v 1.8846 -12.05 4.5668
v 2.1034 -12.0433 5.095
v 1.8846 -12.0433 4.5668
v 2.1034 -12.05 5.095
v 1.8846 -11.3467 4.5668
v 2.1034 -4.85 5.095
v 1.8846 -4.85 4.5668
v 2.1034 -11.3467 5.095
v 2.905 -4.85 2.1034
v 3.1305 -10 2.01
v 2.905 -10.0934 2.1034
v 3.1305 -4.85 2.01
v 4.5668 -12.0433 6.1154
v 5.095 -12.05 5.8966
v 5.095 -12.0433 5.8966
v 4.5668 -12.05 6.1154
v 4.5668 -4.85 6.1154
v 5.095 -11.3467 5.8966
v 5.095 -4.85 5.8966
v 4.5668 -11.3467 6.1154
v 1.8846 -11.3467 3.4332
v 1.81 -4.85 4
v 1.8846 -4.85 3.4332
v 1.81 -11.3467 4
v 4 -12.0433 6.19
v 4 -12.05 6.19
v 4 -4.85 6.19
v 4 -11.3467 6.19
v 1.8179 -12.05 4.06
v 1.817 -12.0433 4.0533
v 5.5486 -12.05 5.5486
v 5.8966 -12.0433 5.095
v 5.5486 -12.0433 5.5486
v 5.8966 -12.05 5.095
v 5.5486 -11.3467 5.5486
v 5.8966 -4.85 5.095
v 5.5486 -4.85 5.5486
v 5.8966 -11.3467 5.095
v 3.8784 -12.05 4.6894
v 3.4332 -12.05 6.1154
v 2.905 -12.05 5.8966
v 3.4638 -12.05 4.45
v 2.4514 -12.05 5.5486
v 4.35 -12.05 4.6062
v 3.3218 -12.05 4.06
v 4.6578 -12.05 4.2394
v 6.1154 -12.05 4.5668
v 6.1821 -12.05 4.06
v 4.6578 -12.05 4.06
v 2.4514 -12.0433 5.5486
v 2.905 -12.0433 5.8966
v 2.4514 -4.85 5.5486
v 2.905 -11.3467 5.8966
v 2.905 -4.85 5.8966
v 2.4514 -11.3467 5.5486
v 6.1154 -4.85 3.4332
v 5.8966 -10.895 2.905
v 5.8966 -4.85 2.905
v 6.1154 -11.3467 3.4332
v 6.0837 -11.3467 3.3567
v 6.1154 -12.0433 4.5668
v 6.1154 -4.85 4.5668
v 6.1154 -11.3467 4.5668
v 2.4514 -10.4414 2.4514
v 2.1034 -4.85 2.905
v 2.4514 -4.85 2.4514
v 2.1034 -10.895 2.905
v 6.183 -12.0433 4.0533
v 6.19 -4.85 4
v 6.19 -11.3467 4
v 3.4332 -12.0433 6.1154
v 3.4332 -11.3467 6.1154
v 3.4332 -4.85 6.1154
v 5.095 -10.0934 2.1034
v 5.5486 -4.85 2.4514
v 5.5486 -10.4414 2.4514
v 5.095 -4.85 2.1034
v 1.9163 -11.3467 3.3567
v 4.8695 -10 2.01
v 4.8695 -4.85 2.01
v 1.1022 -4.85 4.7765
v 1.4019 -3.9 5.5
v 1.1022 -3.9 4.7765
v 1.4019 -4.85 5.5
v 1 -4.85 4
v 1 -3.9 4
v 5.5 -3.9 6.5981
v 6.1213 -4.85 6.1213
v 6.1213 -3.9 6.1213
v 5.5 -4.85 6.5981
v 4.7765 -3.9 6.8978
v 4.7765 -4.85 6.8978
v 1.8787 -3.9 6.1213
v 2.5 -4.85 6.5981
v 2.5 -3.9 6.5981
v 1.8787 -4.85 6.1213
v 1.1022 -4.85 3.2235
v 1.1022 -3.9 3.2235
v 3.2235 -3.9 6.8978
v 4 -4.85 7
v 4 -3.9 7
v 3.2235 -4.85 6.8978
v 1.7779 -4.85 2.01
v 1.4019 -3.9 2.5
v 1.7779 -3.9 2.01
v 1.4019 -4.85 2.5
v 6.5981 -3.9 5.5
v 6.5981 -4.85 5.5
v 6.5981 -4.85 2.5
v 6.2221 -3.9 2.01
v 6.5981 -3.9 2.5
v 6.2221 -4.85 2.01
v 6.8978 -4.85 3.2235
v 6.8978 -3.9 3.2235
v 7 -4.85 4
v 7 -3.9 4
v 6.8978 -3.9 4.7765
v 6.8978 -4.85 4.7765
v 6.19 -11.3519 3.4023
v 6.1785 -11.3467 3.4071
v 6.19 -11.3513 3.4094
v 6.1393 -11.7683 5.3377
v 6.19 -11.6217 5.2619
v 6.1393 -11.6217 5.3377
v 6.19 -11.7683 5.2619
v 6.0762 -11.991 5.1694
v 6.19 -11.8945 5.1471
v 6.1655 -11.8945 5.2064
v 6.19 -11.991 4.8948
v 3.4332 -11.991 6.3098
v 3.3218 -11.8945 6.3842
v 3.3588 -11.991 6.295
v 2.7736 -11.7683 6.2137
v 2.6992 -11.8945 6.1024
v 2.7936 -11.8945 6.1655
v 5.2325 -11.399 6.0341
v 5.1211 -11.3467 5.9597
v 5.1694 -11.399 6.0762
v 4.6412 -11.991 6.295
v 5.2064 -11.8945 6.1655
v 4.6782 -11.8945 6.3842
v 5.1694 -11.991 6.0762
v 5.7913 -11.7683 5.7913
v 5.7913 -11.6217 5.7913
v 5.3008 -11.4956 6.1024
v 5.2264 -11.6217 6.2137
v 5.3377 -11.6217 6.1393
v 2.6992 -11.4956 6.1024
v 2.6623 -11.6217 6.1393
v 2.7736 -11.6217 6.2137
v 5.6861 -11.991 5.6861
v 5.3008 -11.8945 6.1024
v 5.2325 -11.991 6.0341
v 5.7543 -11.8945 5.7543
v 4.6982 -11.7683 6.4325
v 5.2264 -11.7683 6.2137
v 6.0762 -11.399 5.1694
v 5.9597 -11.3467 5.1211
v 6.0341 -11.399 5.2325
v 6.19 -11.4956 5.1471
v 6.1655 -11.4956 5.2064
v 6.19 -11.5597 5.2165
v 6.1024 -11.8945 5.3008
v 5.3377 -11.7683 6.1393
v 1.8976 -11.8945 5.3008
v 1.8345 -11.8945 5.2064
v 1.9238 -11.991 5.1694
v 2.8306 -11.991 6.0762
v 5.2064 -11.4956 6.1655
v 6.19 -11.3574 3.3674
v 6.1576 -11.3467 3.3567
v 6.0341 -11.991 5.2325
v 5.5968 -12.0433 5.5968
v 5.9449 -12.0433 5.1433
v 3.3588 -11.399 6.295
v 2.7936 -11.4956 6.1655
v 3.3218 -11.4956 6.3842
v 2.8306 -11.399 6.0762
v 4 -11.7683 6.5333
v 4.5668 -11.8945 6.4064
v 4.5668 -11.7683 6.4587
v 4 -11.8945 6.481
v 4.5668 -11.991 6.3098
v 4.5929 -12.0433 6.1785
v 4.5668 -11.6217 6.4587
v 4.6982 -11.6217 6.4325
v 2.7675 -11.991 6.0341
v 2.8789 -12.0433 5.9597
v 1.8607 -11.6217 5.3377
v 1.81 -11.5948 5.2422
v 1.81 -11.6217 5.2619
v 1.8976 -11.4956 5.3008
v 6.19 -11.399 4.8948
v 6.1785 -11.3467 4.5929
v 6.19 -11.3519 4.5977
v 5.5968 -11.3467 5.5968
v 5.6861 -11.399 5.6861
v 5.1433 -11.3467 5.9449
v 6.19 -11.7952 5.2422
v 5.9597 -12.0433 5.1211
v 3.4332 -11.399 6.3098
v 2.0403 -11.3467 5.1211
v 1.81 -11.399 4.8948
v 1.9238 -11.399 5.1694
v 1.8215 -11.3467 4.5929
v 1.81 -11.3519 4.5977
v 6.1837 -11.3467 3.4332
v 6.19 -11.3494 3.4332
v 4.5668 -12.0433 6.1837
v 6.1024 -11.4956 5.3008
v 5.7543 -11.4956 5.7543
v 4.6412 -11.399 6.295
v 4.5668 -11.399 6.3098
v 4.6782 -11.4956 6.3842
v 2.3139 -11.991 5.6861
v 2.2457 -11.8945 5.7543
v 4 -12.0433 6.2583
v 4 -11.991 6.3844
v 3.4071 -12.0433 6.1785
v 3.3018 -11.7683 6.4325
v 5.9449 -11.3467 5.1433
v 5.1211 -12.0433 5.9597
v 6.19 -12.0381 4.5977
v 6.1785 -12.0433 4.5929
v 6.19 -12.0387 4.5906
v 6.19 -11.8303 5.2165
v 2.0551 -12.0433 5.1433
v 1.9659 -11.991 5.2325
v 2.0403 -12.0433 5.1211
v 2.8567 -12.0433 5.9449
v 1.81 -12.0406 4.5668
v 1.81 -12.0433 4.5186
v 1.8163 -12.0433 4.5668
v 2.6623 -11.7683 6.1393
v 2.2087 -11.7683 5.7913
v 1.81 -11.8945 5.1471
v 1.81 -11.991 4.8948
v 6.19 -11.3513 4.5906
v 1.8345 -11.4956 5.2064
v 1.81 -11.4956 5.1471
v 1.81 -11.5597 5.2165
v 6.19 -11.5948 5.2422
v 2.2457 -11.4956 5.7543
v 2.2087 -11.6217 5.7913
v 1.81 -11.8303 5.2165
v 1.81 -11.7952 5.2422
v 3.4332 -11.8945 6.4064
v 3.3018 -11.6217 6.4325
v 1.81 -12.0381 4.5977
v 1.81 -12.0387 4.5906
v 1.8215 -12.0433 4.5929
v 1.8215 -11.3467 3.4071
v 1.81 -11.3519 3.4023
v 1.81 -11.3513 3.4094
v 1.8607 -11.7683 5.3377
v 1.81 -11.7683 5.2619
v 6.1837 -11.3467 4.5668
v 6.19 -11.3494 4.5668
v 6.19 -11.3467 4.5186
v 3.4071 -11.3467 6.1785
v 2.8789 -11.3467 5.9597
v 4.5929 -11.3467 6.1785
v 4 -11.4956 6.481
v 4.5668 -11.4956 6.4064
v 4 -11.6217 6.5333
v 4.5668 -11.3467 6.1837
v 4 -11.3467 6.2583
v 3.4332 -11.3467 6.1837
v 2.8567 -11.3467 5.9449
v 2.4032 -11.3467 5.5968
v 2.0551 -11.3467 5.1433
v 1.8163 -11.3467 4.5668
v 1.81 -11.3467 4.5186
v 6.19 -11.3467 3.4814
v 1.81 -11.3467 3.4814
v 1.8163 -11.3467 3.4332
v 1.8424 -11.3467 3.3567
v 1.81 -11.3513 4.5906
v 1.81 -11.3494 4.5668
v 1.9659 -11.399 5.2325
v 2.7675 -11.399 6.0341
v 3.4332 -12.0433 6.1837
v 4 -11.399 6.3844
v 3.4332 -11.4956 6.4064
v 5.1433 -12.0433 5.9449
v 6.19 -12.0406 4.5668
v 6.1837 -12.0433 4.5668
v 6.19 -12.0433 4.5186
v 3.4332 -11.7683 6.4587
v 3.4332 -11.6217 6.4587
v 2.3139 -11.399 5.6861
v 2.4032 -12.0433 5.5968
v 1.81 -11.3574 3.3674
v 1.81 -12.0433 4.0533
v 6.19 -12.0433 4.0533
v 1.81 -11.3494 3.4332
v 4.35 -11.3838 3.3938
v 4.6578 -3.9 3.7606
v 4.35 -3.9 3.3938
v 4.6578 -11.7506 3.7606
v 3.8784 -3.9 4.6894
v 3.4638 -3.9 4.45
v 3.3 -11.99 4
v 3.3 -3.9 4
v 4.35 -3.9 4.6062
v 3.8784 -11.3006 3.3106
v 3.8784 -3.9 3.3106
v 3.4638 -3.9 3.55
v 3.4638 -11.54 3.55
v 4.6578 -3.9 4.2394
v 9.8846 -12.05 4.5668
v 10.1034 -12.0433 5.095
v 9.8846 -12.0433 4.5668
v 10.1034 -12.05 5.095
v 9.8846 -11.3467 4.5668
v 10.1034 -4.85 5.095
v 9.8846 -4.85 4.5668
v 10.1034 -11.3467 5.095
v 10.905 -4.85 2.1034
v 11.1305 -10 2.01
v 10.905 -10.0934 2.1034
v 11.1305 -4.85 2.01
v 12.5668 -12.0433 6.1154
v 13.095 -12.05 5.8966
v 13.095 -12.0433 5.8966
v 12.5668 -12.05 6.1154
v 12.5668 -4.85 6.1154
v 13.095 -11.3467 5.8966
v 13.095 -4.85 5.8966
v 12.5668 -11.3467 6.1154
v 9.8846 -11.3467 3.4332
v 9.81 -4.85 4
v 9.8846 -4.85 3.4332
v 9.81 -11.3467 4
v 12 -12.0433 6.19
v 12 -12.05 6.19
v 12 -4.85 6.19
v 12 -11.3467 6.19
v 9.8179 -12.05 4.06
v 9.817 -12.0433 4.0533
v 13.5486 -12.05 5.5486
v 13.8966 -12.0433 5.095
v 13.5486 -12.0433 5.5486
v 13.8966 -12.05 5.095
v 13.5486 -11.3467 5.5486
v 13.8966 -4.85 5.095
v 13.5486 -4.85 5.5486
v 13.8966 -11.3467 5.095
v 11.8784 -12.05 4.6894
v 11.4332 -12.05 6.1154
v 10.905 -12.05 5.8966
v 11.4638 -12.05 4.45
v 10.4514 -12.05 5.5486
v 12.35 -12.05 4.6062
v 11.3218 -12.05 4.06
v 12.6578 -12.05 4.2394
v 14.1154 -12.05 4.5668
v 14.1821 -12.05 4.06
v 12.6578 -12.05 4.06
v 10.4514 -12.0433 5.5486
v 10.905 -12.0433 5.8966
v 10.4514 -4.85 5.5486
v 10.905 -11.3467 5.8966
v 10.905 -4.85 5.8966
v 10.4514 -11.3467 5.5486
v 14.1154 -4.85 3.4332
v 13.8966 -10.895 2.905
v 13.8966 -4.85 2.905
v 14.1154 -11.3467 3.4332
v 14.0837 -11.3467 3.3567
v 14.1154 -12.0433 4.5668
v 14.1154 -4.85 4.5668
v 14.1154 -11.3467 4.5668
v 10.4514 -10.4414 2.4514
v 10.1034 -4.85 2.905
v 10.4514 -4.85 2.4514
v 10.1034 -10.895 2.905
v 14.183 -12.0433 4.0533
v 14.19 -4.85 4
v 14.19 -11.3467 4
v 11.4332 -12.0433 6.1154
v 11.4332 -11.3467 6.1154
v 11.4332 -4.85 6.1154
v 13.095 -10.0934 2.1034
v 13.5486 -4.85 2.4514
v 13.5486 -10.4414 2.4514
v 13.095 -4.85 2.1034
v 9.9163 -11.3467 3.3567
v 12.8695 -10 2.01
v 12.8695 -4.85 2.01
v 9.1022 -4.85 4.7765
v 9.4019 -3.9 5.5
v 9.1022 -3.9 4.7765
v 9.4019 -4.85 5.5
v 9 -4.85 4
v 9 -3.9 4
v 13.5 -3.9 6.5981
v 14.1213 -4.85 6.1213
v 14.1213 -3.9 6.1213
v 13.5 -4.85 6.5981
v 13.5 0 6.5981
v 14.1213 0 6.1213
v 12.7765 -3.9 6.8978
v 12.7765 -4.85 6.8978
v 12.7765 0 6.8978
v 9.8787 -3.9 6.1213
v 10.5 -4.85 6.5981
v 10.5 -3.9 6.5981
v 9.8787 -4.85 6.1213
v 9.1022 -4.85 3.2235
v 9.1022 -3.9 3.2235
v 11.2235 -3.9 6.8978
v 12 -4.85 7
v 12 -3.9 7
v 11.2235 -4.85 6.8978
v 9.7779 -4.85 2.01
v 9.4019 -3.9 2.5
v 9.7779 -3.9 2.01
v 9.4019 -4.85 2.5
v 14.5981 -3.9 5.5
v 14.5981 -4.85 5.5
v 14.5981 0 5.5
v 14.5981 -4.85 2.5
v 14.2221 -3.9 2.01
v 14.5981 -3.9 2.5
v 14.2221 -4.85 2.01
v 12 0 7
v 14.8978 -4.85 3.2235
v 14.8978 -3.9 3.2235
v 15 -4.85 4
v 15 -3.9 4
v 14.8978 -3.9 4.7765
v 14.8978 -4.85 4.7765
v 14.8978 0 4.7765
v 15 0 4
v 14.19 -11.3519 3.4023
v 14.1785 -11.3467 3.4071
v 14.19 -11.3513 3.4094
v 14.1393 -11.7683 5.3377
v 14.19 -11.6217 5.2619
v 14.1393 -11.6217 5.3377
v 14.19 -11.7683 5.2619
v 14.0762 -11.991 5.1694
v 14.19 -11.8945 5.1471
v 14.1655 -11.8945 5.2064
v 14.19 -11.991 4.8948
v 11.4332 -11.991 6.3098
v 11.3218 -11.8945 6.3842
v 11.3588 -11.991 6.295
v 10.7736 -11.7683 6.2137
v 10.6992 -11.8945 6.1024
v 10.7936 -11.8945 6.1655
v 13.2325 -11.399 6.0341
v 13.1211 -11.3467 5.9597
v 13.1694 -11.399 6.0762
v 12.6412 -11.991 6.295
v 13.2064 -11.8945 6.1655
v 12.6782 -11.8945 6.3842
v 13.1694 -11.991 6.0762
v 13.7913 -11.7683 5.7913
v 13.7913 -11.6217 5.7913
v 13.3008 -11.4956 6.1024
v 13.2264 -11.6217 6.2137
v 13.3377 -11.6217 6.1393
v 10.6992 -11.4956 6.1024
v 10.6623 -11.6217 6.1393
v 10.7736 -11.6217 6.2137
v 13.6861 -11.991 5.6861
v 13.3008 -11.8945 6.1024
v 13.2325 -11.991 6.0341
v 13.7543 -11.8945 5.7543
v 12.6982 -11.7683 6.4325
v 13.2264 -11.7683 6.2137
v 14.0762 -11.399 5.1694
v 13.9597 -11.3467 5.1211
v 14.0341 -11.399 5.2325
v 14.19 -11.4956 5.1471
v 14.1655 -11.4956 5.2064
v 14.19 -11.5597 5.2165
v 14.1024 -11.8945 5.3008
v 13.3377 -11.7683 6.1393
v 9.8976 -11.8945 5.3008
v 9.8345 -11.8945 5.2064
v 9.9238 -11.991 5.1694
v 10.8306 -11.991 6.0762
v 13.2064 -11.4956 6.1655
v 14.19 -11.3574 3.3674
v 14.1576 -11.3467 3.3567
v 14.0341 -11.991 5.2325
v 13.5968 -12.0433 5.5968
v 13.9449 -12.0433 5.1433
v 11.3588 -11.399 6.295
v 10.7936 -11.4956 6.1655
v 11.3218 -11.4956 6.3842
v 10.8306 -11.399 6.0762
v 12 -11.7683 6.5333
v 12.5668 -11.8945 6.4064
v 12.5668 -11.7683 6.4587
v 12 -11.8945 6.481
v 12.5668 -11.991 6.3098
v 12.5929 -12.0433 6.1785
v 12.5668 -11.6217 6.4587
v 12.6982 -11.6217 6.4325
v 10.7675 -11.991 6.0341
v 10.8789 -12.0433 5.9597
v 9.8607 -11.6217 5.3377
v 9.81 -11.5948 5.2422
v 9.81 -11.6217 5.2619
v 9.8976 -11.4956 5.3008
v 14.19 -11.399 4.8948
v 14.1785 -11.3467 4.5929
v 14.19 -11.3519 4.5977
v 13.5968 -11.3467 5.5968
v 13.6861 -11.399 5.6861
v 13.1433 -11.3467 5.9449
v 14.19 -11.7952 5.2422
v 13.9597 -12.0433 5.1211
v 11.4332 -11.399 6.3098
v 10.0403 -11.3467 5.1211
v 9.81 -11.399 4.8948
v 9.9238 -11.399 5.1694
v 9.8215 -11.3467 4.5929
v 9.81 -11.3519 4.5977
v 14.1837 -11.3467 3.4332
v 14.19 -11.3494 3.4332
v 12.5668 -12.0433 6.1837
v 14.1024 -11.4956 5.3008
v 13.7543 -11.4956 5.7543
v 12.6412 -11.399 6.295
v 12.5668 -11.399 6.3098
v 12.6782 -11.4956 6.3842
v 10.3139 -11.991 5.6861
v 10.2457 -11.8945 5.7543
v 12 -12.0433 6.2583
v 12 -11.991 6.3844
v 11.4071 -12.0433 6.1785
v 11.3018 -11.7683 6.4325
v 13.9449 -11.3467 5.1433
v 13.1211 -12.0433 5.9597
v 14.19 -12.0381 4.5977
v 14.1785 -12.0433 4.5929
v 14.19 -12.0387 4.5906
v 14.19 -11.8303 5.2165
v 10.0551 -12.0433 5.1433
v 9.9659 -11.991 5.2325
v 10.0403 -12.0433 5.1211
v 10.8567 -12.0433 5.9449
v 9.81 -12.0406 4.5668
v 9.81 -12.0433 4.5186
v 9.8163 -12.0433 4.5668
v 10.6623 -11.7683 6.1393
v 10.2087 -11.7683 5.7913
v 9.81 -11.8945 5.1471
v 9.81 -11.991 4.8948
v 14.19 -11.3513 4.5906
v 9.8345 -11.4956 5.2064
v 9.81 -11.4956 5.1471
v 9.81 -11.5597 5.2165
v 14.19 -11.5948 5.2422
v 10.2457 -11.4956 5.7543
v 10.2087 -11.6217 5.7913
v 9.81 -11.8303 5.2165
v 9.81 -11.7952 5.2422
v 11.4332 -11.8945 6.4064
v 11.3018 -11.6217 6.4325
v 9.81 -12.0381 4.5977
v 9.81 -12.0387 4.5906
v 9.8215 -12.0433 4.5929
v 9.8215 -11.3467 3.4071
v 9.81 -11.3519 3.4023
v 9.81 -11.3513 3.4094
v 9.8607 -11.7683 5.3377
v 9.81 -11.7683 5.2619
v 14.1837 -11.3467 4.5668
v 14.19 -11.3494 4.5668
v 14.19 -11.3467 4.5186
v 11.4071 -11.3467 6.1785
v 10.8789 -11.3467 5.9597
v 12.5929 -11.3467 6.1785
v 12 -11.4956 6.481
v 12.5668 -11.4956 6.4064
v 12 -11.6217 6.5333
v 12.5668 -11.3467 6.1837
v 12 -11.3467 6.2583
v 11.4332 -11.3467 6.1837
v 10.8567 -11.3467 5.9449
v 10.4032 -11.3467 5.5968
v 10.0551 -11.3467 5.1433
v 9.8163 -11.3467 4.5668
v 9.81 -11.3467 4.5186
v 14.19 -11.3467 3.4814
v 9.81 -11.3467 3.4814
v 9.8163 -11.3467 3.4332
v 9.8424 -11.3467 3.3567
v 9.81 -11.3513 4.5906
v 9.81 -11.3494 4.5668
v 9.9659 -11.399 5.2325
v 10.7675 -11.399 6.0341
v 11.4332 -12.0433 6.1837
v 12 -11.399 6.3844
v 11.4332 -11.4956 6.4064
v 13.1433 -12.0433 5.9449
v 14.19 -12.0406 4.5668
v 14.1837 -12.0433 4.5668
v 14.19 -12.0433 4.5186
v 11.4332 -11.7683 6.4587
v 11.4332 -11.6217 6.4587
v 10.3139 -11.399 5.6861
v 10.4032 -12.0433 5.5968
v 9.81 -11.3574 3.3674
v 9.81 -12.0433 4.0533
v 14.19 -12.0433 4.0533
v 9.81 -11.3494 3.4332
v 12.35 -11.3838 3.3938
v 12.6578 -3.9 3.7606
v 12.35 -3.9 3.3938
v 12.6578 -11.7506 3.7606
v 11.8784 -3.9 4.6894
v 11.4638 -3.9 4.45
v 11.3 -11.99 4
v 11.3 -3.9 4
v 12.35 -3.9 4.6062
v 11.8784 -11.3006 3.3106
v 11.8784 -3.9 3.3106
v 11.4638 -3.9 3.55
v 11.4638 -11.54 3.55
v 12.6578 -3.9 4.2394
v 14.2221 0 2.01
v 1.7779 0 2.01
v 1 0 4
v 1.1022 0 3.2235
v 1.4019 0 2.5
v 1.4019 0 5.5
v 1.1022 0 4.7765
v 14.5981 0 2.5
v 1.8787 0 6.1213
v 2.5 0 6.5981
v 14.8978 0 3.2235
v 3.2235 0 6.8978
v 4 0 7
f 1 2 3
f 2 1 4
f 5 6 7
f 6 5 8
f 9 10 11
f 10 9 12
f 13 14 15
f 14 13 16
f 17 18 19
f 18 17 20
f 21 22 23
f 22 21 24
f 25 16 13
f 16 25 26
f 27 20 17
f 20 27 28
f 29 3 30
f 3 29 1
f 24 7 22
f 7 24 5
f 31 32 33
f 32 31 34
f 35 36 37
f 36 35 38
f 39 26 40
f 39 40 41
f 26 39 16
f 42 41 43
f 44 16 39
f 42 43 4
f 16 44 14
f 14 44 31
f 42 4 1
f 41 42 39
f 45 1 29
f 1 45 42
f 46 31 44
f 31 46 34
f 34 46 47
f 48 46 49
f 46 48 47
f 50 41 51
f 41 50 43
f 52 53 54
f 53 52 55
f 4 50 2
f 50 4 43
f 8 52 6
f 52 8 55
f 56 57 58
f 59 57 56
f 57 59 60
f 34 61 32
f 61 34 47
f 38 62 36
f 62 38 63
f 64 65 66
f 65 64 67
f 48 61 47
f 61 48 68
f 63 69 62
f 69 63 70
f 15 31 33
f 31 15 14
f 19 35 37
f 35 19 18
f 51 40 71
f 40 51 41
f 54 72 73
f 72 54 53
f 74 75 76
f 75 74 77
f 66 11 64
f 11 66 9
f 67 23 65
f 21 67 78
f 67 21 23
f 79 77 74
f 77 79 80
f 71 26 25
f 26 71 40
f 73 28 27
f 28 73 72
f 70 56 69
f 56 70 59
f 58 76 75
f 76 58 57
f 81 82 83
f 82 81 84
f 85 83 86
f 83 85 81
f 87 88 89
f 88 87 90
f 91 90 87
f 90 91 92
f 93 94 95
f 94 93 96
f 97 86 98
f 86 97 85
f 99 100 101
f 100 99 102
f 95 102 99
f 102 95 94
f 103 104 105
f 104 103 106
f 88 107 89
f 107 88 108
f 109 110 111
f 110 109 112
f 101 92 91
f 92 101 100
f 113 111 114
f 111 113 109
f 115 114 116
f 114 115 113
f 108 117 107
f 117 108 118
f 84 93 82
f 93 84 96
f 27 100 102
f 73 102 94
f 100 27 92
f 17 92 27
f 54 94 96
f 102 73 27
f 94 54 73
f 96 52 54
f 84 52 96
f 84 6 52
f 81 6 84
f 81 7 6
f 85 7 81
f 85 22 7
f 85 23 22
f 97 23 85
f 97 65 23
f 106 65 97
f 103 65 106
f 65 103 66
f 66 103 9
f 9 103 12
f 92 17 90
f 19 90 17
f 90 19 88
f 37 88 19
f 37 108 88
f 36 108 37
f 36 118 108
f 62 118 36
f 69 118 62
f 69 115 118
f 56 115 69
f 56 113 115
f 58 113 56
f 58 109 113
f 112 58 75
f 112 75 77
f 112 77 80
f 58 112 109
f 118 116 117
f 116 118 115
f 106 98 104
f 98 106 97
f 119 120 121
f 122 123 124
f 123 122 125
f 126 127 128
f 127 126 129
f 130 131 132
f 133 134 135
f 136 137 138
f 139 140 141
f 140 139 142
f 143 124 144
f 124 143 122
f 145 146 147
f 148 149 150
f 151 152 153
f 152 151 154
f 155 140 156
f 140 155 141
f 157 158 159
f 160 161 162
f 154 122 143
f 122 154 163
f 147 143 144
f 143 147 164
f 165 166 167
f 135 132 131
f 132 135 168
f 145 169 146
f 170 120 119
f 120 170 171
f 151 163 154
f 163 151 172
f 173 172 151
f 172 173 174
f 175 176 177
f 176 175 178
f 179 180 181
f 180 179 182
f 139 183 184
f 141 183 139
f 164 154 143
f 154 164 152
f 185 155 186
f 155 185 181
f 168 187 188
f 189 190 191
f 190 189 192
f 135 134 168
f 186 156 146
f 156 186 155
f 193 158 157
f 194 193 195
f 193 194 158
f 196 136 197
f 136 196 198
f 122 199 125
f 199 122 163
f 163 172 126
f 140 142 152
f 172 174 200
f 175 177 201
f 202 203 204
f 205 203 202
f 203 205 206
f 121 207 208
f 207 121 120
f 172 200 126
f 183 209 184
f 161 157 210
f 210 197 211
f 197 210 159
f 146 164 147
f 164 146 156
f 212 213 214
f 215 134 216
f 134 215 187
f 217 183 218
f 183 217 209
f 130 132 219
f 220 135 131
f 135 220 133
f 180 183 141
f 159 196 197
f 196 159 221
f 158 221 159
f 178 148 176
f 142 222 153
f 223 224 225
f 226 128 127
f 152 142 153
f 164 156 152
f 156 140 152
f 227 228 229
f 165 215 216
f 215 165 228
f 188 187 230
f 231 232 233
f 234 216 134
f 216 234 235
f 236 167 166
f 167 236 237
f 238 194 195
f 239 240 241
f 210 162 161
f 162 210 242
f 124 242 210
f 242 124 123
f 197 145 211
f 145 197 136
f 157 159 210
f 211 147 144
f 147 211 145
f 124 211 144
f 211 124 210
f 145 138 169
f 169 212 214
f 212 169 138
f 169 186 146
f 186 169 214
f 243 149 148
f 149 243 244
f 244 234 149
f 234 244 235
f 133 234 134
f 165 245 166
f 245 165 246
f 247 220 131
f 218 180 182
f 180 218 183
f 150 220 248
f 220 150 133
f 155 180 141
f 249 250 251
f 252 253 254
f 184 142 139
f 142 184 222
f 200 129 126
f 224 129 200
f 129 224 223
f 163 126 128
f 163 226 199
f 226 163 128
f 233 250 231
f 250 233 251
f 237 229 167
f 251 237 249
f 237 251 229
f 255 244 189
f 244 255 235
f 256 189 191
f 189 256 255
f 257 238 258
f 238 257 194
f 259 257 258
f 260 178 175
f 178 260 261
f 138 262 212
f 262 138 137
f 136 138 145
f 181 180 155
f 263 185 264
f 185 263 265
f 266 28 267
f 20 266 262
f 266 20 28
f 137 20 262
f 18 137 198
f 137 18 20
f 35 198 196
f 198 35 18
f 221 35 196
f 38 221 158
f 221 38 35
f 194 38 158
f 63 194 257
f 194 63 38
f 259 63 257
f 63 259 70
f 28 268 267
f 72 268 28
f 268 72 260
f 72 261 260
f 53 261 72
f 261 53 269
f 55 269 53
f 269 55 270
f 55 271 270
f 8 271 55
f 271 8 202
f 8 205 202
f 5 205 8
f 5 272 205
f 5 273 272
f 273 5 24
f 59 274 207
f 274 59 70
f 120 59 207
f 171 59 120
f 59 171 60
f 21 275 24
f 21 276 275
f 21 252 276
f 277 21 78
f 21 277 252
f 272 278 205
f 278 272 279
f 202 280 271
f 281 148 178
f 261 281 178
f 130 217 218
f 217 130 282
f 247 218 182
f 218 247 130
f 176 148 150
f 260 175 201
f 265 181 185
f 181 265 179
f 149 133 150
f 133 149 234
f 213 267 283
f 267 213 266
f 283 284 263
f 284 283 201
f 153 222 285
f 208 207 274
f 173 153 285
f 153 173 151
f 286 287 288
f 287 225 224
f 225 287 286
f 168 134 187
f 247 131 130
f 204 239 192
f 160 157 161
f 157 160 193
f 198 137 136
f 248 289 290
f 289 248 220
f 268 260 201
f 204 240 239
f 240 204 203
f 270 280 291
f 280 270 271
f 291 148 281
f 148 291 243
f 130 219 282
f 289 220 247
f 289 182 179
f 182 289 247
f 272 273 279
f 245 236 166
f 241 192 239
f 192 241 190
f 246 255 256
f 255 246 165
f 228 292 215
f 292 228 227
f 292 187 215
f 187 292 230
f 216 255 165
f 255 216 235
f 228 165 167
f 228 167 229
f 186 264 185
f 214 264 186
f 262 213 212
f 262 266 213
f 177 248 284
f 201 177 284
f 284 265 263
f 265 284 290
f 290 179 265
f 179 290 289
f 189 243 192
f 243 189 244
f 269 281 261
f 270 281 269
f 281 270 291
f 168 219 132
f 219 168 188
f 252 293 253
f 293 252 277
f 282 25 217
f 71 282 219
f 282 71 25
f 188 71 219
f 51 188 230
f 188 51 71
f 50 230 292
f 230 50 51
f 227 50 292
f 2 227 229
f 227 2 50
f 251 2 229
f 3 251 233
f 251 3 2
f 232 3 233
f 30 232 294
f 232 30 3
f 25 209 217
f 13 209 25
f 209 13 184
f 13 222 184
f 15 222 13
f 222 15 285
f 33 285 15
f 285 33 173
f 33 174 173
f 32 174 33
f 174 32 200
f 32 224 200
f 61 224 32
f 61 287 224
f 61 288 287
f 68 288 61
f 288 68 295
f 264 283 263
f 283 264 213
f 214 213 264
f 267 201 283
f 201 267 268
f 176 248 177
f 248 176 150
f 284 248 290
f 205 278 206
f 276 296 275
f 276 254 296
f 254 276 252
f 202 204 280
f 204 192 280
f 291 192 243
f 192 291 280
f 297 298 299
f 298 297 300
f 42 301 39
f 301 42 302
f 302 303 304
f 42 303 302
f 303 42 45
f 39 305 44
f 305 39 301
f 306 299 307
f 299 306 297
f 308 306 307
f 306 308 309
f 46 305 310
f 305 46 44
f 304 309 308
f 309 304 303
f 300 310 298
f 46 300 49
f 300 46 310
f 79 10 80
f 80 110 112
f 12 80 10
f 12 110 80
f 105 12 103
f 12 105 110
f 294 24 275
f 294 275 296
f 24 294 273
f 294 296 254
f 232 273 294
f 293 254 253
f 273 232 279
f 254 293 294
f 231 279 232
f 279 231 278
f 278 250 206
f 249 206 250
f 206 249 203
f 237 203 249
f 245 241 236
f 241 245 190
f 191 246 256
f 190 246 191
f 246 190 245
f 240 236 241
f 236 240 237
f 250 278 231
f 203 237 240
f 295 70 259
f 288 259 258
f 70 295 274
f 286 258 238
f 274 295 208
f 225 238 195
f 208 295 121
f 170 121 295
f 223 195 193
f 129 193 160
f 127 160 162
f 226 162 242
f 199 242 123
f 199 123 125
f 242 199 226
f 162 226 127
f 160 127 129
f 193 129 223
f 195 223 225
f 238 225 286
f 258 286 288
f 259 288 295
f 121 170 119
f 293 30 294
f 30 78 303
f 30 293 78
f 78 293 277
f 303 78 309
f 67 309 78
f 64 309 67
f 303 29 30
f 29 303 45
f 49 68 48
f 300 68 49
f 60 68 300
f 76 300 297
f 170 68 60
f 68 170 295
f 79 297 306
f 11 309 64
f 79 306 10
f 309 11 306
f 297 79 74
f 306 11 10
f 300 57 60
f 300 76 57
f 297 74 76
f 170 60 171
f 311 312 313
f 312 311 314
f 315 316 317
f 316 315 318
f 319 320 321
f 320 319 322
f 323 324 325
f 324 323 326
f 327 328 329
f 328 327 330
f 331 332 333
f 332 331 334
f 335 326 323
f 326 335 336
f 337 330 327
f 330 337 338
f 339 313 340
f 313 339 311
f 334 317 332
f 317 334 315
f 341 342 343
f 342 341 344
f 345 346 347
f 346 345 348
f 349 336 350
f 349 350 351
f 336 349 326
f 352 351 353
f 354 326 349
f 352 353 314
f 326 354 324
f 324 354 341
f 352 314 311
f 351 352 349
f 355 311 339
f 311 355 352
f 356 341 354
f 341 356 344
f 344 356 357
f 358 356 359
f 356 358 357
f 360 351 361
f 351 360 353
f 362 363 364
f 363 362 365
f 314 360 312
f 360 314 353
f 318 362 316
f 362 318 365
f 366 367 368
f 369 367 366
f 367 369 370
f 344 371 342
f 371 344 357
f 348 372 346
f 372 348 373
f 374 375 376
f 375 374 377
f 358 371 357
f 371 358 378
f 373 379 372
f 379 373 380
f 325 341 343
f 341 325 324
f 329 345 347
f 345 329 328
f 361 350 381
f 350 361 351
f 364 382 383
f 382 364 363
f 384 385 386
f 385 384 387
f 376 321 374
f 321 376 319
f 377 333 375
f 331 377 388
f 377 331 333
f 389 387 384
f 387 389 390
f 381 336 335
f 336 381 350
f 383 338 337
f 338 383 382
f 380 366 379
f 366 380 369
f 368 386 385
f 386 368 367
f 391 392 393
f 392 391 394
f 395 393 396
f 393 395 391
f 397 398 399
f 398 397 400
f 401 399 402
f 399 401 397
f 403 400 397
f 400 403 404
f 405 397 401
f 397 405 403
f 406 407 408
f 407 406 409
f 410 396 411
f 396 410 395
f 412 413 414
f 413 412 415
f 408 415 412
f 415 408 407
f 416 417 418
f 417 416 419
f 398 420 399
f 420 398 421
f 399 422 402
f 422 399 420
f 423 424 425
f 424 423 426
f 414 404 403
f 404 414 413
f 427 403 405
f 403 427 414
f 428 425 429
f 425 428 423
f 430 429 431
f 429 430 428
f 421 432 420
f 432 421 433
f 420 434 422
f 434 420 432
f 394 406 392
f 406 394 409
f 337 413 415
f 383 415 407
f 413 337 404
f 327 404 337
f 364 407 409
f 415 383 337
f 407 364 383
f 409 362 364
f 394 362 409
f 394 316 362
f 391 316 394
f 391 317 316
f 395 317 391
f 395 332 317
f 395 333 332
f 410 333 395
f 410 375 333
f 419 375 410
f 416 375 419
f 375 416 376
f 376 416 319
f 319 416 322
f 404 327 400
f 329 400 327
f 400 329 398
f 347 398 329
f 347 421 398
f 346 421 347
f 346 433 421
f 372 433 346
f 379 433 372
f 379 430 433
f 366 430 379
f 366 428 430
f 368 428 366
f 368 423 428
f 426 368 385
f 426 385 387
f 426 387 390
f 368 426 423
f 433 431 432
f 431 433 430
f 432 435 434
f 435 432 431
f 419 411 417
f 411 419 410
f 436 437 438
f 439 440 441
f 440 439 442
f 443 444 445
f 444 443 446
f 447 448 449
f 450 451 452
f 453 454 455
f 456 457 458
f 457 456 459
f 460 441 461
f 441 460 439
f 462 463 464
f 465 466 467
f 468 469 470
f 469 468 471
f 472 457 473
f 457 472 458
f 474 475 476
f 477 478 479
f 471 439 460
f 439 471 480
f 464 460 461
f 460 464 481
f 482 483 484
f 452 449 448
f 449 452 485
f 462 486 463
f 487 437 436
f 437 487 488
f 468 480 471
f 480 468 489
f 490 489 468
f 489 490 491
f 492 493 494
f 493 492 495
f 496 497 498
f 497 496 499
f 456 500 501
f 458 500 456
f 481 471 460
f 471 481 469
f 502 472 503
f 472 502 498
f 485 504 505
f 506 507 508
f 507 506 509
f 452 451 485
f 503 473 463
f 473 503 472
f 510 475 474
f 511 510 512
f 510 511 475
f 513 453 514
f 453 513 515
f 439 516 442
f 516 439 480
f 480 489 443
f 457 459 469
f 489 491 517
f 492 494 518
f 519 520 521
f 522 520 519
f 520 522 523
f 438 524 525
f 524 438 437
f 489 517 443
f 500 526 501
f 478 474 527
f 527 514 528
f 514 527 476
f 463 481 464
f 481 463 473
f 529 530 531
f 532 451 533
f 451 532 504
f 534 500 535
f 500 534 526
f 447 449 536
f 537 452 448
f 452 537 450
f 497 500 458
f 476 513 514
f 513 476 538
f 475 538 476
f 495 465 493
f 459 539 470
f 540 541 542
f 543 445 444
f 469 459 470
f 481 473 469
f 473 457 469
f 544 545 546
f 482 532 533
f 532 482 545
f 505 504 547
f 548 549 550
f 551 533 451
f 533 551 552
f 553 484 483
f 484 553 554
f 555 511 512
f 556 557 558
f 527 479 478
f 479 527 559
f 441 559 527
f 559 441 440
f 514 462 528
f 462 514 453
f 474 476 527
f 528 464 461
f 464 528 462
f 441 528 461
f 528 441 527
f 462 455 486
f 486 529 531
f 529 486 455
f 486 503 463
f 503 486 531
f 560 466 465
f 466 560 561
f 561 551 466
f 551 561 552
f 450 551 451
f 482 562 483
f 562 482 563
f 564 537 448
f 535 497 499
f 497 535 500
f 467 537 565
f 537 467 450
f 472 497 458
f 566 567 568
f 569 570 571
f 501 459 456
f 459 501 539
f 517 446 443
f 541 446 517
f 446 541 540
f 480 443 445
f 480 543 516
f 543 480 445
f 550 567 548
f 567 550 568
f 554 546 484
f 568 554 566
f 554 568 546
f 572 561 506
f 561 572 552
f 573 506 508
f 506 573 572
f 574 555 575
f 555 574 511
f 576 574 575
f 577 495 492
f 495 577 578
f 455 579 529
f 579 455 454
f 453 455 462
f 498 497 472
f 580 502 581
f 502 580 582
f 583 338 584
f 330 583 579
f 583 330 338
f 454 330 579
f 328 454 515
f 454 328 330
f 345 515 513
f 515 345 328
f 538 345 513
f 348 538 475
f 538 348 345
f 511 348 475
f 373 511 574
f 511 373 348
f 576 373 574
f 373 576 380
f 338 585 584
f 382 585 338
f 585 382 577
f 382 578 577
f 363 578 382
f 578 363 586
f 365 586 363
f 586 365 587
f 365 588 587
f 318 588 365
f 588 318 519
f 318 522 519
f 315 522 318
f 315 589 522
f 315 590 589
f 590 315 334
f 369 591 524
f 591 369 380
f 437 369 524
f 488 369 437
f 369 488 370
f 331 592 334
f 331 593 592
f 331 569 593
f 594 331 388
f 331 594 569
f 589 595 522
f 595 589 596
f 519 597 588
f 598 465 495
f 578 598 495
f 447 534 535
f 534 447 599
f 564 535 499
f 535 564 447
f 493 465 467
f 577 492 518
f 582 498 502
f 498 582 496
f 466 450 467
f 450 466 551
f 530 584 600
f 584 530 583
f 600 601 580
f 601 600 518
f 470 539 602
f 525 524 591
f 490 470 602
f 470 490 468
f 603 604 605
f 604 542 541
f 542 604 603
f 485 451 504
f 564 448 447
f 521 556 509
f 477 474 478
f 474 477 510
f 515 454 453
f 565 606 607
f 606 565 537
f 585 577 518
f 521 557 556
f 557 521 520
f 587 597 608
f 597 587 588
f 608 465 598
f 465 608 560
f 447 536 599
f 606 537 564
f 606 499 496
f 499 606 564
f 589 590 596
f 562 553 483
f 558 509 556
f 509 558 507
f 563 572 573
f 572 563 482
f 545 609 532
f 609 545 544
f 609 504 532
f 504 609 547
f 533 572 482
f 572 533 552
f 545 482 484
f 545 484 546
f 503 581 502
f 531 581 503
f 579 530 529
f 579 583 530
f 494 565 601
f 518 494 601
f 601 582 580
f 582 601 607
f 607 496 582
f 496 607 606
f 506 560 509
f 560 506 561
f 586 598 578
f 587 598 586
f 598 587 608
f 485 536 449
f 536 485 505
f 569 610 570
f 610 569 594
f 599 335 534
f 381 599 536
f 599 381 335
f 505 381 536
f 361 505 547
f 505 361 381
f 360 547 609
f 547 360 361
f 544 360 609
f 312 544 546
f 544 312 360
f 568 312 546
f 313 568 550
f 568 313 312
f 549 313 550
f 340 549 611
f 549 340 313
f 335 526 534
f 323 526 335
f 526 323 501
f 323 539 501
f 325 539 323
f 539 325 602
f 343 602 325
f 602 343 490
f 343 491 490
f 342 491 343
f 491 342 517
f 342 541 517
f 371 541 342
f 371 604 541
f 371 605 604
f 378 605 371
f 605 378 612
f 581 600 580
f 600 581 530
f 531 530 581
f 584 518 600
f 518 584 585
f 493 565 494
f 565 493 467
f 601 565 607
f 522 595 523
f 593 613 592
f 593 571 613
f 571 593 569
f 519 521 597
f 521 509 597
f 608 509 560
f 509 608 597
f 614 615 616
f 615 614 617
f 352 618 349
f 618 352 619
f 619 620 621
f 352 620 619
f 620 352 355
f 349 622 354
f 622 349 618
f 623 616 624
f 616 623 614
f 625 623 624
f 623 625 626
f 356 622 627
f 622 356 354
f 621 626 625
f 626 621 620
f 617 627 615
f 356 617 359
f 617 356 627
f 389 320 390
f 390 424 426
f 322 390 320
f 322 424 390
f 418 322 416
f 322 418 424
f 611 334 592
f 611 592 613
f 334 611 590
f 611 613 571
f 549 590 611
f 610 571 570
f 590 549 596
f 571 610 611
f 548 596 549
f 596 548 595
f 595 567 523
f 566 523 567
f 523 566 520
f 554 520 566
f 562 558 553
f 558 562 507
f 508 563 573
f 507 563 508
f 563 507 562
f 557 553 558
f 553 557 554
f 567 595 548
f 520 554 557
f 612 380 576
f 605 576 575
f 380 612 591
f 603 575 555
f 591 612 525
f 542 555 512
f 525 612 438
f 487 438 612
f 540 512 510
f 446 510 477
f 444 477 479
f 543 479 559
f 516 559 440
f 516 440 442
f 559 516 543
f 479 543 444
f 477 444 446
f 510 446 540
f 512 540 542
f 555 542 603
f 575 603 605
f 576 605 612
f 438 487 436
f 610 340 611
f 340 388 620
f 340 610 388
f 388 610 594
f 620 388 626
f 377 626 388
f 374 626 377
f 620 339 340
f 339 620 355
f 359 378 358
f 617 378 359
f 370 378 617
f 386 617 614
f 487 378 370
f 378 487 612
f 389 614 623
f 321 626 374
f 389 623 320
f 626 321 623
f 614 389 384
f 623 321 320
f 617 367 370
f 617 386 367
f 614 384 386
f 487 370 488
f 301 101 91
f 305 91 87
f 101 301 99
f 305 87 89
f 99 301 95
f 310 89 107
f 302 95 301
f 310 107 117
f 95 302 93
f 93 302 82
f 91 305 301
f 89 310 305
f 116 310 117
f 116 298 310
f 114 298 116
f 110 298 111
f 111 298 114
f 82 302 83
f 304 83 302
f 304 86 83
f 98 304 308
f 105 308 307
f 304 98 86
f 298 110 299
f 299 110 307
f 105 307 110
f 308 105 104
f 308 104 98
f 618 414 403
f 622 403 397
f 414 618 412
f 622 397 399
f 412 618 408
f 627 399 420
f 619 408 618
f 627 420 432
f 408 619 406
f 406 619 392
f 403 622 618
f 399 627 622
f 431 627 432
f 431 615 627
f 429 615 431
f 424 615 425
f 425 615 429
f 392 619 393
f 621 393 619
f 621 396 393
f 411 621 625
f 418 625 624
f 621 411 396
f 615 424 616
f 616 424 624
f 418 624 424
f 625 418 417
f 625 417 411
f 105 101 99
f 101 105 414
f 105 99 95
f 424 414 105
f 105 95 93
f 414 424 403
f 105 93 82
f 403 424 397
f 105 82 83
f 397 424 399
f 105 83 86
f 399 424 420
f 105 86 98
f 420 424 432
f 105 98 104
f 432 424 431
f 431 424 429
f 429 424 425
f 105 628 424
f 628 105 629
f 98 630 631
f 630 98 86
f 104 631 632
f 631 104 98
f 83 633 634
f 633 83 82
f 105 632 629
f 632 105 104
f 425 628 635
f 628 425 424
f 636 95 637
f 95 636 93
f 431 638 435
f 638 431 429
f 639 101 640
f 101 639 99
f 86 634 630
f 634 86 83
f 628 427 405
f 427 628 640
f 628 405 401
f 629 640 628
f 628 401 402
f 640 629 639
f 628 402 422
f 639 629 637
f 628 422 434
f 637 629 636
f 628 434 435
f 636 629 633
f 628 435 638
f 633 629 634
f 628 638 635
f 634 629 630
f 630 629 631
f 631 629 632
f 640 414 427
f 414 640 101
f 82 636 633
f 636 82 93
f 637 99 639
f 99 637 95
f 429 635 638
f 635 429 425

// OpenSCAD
// file: PELA-simplified-technic-peg.scad
/*
PELA Parametric LEGO-compatible Technic Connector Peg

PELA Parametric Blocks - 3D Printed LEGO-compatible parametric blocks

Published at https://PELAblocks.org

By Paul Houghton
Twitter: @mobile_rat
Email: paulirotta@gmail.com
Blog: https://medium.com/@paulhoughton

Creative Commons Attribution-ShareAlike 4.0 International License
    https://creativecommons.org/licenses/by-sa/4.0/legalcode

Open source design, Powered By Futurice. Come work with the best.
    https://www.futurice.com/
*/

include <../style.scad>
include <../material.scad>
use <../PELA-block.scad>
use <PELA-technic-peg.scad>

/* [Technic Simplified Peg] */

// Show the inside structure [mm]
_cut_line = 0; // [0:1:100]

// Printing material (set to select calibrated knob, socket and axle hole fit)
_material = 0; // [0:PLA, 1:ABS, 2:PET, 3:Biofila Silk, 4:Pro1, 5:NGEN, 6:NGEN FLEX, 7:Bridge Nylon, 8:TPU95, 9:TPU85/NinjaFlex, 10:Polycarbonite]
// Is the printer nozzle >= 0.5mm? If so, some features are enlarged to make printing easier
_large_nozzle = true;

// An axle which fits loosely in a technic bearing hole
_axle_radius = 2.1; // [0.1:0.1:4]

// Size of the hollow inside a pin
_peg_center_radius=0.8; // [0.1:0.1:4]

// Size of the connector lock-in bump at the ends of a Pin
_peg_tip_length = 0.7; // [0.1:0.1:4]

// Width of the long vertical flexture slots in the side of a pin
_peg_slot_thickness = 0.0; // [0.1:0.1:4]


/* [Simplified Peg] */

// Size of the flat bottom cut to make the pin more easily printable
_bottom_flatness = 0.2; // [0.0:0.1:5]

// Size of the end angle cuts to ease tip flex
_end_cut_length = 6; // [0.0:0.1:10]





///////////////////////////////
// DISPLAY
///////////////////////////////

simplified_peg(material=_material, large_nozzle=_large_nozzle, cut_line=_cut_line, axle_radius=_axle_radius, peg_center_radius=_peg_center_radius, peg_length=_peg_length, peg_tip_length=_peg_tip_length, peg_slot_thickness=_peg_slot_thickness, bottom_flatness=_bottom_flatness, end_cut_length=_end_cut_length);



//////////////////
// Functions
//////////////////

module simplified_peg(material, large_nozzle, cut_line, axle_radius, peg_center_radius, peg_length, peg_tip_length, peg_slot_thickness, bottom_flatness, end_cut_length) {

    assert(material!=undef);
    assert(large_nozzle!=undef);
    assert(cut_line!=undef);
    assert(axle_radius!=undef);
    assert(peg_center_radius!=undef);
    assert(peg_length!=undef);
    assert(peg_tip_length!=undef);
    assert(peg_slot_thickness!=undef);
    assert(bottom_flatness!=undef);
    assert(end_cut_length!=undef);

    translate([0, 0, -axle_radius+bottom_flatness]) {
        intersection() {
            translate([0, 0, axle_radius - bottom_flatness]) {
                rotate([0, 90, 0]) {
                    peg(material=material, large_nozzle=large_nozzle, cut_line=cut_line, axle_radius=axle_radius, peg_center_radius=peg_center_radius, peg_length=peg_length, peg_tip_length=peg_tip_length, peg_slot_thickness=peg_slot_thickness);
                }
            }
            
            simplified_peg_cut(material=material, peg_length=peg_length, end_cut_length=end_cut_length, axle_radius=axle_radius);
        }
    }
}


module simplified_peg_cut(material, peg_length, end_cut_length, axle_radius) {
    difference() {
        union() {
            width = is_flexible(material) ? 100 : axle_radius;

            translate([-100, -width, 0]) {
                cube([200, 2*width, 100]);
            }

            translate([-peg_length/2, -100, 0]) {
                cube([peg_length, 200, 100]);
            }
        }

        echo(material);

        if (!is_flexible(material)) {
            union() {
                translate([-end_cut_length, -10, 0]) {
                    rotate([0, -135, 0]) {
                        cube([20, 20, 20]);
                    }
                }
                    
                translate([end_cut_length, -10, 0]) {
                    rotate([0, 45, 0]) {
                        cube([20, 20, 20]);
                    }
                }
            }
        }
    }
}
// file: ../style.scad
/*
PELA Parametric Block Style

Alter the baseline style of all designs. Many designs will locally override some but not all of these parameters.

Published at https://PELAblocks.org

By Paul Houghton
Twitter: @mobile_rat
Email: paulirotta@gmail.com
Blog: https://medium.com/@paulhoughton

Creative Commons Attribution-ShareAlike 4.0 International License
    https://creativecommons.org/licenses/by-sa/4.0/legalcode

Open source design, Powered By Futurice. Come work with the best.
    https://www.futurice.com/

Import this into other design files to set baseline constants:
    include <style.scad>

If the nozzle you normally use on your printer is 0.5mm or less, edit line 31 to read:
    31:     large_nozzle = false; // [true:nozzle >= 0.5mm, false:nozzle < 0.5mm]

There are many other parameters here which affect all generated PELA models. Any changes you make here affect all models unless that parameter is locally updated in a given model. Where models duplicate these settings, the local value will appear in the "Customizer" view of OpenSCAD. Think of those local overrides of these default style settings as a design decision: changing that parameter for that particular model is likely to be useful to you.

*/

include <material.scad>


/* [Block] */

// Presence of bottom connector sockets
_sockets = true;

// Presence of top connector knobs
_knobs = true;

// Place holes in the corners for mountings screws (0=>no holes, 1=>holes)
_corner_bolt_holes = false;

// Size of corner holes for M3 mountings bolts
_bolt_hole_radius = 1.6; // [0.0:0.1:3.0]

// Add interior fill for the base layer
_solid_first_layer = false;

// Add interior fill for upper layers
_solid_upper_layers = true;


/* [Knob] */

// Knob top surface strength
_knob_top_thickness = 1.0;

// Height of traditional connectors [mm] (taller gives a stronger hold)
_knob_height = 2.9; // [0:disabled, 1.8:traditional, 2.9:PELA 3D print tall]

// Size of a hole in the top of each knob. Set 0 to disable for best flexture or enable for air circulation/aesthetics/drain resin
_knob_vent_radius = 0.0; // [0.0:0.1:4]

// Ease insertion by slightly widening the socket entry
_bevel_socket = true;

// Height of a small bottom knob insert easement, flaring the bottom edges to make assembly easier
_socket_insert_bevel = 0.1;




/* [Technic] */

// Technic connector hole
//axle_hole_radius = 2.45 + axle_hole_tweak;

// Add full width through holes spaced along the length for techic connectors
_side_holes = 3; // [0:disabled, 1:short air vents, 2:short connectors, 3:full width connectors]

// Add a wrapper around side holes (disable for extra ventilation but loose lock notches)
_side_sheaths = true;

// Add short end holes spaced along the width for techic connectors
_end_holes = 2; // [0:disabled, 1:short air vents, 2:short connectors, 3:full length connectors]

// Add a wrapper around end holes (disable for extra ventilation but loose lock notches)
_end_sheaths = true;

// Add holes in the top deck to improve airflow and reduce weight
_top_vents = false;


/* [Shell] */

// Thickness of the solid top surface of the block
_top_shell = 1;


/* [Advanced Block] */

// Basic unit vertical size of each block
_block_height = 8; // [8:technic, 9.6:traditional knobs]

// Horizontal clearance space removed from the outer horizontal surface to allow two parts to be placed next to one another on a 8mm grid [mm]
_skin = 0.1; // [0:0.02:0.5]

// Height of the hole beneath each knob which facilitates click lock in low-flex materials by variable side pressure on any block above
_knob_flexture_height = 4.5;

// Width of horizontal surface strengthening slats between the bottom rings
_bottom_stiffener_width = 2.6;

// Height of horizontal surface strengthening slats (appears between the bottom rings, default is material.scad:knob_height)
_bottom_stiffener_height = _knob_height;


/* [Advanced Technic] */

// Technic connector hole inset radius
_counterbore_inset_radius = 3.1; // [0.1:0.1:4]

// Technic connector hole inset depth
_counterbore_inset_depth = 0.95; // [0.1:0.1:4]

// Contact length of axle to block (not including inset length and end snap fit flexture in peg connectors)
_peg_length = 6.5; // [0.1:0.1:16]

// Size of the cylinder wrapped around the technic holes
_bearing_sheath_thickness = 0.9; // [0.1:0.1:4]


/* [Block Aesthetics] */

// Width of a line etched in the side of multi-layer block sets (0 to disable)
_ridge_width = 0.15; // [0.1:0.05:4]

// Depth of a line etched in the side of multi-layer block sets
_ridge_depth = 0.3; // [0.1:0.05:4]


/* [Baked Print Supports] */

// Generate print-time support aid structures for models which offer this. Turn this off if you will use slicer-generated print supports, but be aware that these may make the bottom connectors difficult to post process.
_print_supports = true;

// Space between support/support.scad and the part)
_support_offset_from_part = 0.1; // [0.0:0.01:1]

// Thickness of each rotating layer in a twisting support [mm]
_support_layer_height = 2; // [0.1:0.1:8]

// Thickness of a base panel for holding supports together [mm]
_support_connection_height = 0.5; // [0.1:0.1:8]

// Length of sides of a support equilateral triangle [mm]
_support_side_length = 4; // [0.1:0.1:16]

// Per layer support rotation for strength [degrees]
_support_layer_rotation = 6; // [1:179]

// Reverse direction of support rotation periodically to constrain size [degrees] (0 to disable)
_support_max_rotation = 0; // [0:360]


/* [Hidden] */

// Basic unit horizontal size of each block
_block_width = 8; // [8:technic and traditional blocks]

// Height of the connectors commercial blocks use [mm]
_official_knob_height = 1.8; // [1.8:traditional blocks]

// Slight visual offset to work around prevent goldfeather rendering bugs in OpenSCAD (visual, not affecting final print geometry) [mm]
_defeather = 0.01;

// Roundness of bottom connector rings (Use 8 for octagonal sockets- many parts of the geomoetry must be adjusted if you change this)
_ring_fn=8;

// Roundness of bottom connector rings (Use 8 for octagonal sockets- many parts of the geomoetry must be adjusted if you change this)
_axle_hole_fn=32;

// Minimum angle to approximate a circle
$fa = 15;

// Minimum segment length to approximate a circle
$fs = 0.5;


/////////////////////////////////////
// FUNCTIONS
/////////////////////////////////////

// Horizontal size
function block_width(i=1) = i*_block_width;

// Vertical size [mm]
function block_height(h=1, block_height) = h*block_height;

// Test if this is a corner block
function is_corner(x, y, l, w) = (x==0 || x==l-1) && (y==0 || y==w-1);

// Ratio of a flat panel thickness to a regular block thickness (1/2 for PELA 8mm tall blocks, 1/3 for LEGO 9.6mm block_height blocks)
function panel_height_ratio(block_height) = block_height < 9.6 ? 1/2 : 1/3;

// Thickness of a flat panel [mm]
function panel_height(block_height) = block_height(1, block_height=_block_height)*panel_height_ratio(block_height=_block_height);

// Bottom connector additional distance from outside lock and connector rings which small flexture-fit rims protrude inwards to grab the base of knobs for asymmetric side pressure to assist with snap fit [mm]
function side_lock_thickness(material) = is_flexible(_material) ? 0.06 : 0.02;

// Horizontal width of each side of a support triangle [mm]
function support_line_width(large_nozzle) = large_nozzle ? 0.7 : 0.5;

// Force the cut visual line for seeing inside parts to be between 0 and 1mm short of the part width [mm]
function visual_cut(cut_line, w) = max(min(cut_line, block_width(w)), 0);

// Thickness of the solid outside surface of the block [mm]
function side_shell(large_nozzle) = large_nozzle ? 1.2 : 1.0;
// main file
/*
PELA Parametric LEGO-compatible Technic Connector Peg Set

PELA Parametric Blocks - 3D Printed LEGO-compatible parametric blocks

Published at https://PELAblocks.org

By Paul Houghton
Twitter: @mobile_rat
Email: paulirotta@gmail.com
Blog: https://medium.com/@paulhoughton

Creative Commons Attribution-ShareAlike 4.0 International License
    https://creativecommons.org/licenses/by-sa/4.0/legalcode

Open source design, Powered By Futurice. Come work with the best.
    https://www.futurice.com/
*/

include <../style.scad>
include <../material.scad>
use <../PELA-block.scad>
use <PELA-technic-peg.scad>
use <PELA-simplified-technic-peg.scad>



/* [Render] */

// Show the inside structure [mm]
_cut_line = 0; // [0:1:100]

// Printing material (set to select calibrated knob, socket and axle hole fit)
_material = 0; // [0:PLA, 1:ABS, 2:PET, 3:Biofila Silk, 4:Pro1, 5:NGEN, 6:NGEN FLEX, 7:Bridge Nylon, 8:TPU95, 9:TPU85/NinjaFlex, 10:Polycarbonite]

// Is the printer nozzle >= 0.5mm? If so, some features are enlarged to make printing easier
_large_nozzle = true;

// Create the simplified model (note: specifying a flex material changes the shape)
_simplified = true;


/* [Technic Peg] */

// An axle which fits loosely in a technic bearing hole
_axle_radius = 2.19; // [0.1:0.1:4]

// Size of the hollow inside a peg
_peg_center_radius = 0.7; // [0:0.1:4]

// Size of the connector lock-in bump at the ends of a Pin
_peg_tip_length = 0.7; // [0.1:0.1:4]

// Width of the long vertical flexture slots in the side of a peg
_peg_slot_thickness = 0.4; // [0.1:0.1:4]


/* [Technic Pin Array] */

// The number of half-pegs in an array supported by as base
_array_count = 2; // [2:1:20]

 // The thickness of the base below an array of half-pegs
 _base_thickness = 4; // [0:0.1:20]

// Distance between pegs
_array_spacing = 8;

// Trim the base connecting a peg array to the minimum rounded shape
_minimum_base = true;


/* [Simplified Peg] */
// Size of the flat bottom cut to make the peg more easily printable
_bottom_flatness = 0.2; // [0.0:0.1:5]

// Size of the end angle cuts to ease tip flex
_end_cut_length = 6; // [0.0:0.1:10]

/* [Hidden] */
_skin = 0.1;


///////////////////////////////
// DISPLAY
///////////////////////////////
technic_peg_array(material=_material, large_nozzle=_large_nozzle, cut_line=_cut_line, simplified=_simplified, peg_tip_length=_peg_tip_length, peg_length=_peg_length, array_count=_array_count, array_spacing=_array_spacing, base_thichness=_base_thickness, axle_radius=_axle_radius, peg_center_radius=_peg_center_radius, peg_slot_thickness=_peg_slot_thickness, minimum_base=_minimum_base, base_thickness=_base_thickness, block_height=_block_height,  bottom_flatness=_bottom_flatness, end_cut_length=_end_cut_length, skin=_skin);

module technic_peg_array(material, large_nozzle, cut_line, simplified, peg_tip_length, peg_length, array_count, array_spacing, base_thichness, axle_radius, peg_center_radius, peg_slot_thickness, minimum_base, base_thickness, block_height, bottom_flatness, end_cut_length, skin) {

    assert(material!=undef);
    assert(large_nozzle!=undef);
    assert(cut_line!=undef);
    assert(simplified!=undef);
    assert(peg_tip_length!=undef);
    assert(peg_length!=undef);
    assert(array_count!=undef);
    assert(array_spacing!=undef);
    assert(base_thichness!=undef);
    assert(axle_radius!=undef);
    assert(peg_center_radius!=undef);
    assert(peg_slot_thickness!=undef);
    assert(minimum_base!=undef);
    assert(base_thickness!=undef);
    assert(block_height!=undef);
    assert(bottom_flatness!=undef);
    assert(end_cut_length!=undef);
    assert(skin!=undef);

    counterbore_holder_height = cb_holder_height(_counterbore_inset_depth, _skin);

    counterbore_holder_radius = cb_holder_radius(_counterbore_inset_radius, _skin);

    x_rotation = simplified ? 90 : 0;

    rotate([x_rotation, 0, 0]) {
        peg_array(material=material, large_nozzle=large_nozzle, cut_line=cut_line, simplified=_simplified, array_count=array_count, array_spacing=_array_spacing, base_thichness=base_thickness, axle_radius=axle_radius, peg_center_radius=peg_center_radius, peg_length=peg_length, peg_tip_length=peg_tip_length, peg_slot_thickness=peg_slot_thickness, minimum_base=minimum_base, base_thickness=base_thickness, block_height=block_height, counterbore_holder_radius=counterbore_holder_radius, counterbore_holder_height=counterbore_holder_height, bottom_flatness=bottom_flatness, end_cut_length=end_cut_length, skin=skin);
    }
}




// A set of half-pegs connected by at the base
module peg_array(material, large_nozzle, cut_line, simplified, array_count, array_spacing, base_thichness, axle_radius, peg_center_radius, peg_length, peg_tip_length, peg_slot_thickness, minimum_base, base_thickness, block_height, counterbore_holder_radius, counterbore_holder_height, bottom_flatness, end_cut_length, skin) {

    assert(material!=undef);
    assert(large_nozzle!=undef);
    assert(cut_line!=undef);
    assert(simplified!=undef);
    assert(array_count!=undef);
    assert(array_spacing!=undef);
    assert(base_thichness!=undef);
    assert(axle_radius!=undef);
    assert(peg_center_radius!=undef);
    assert(peg_length!=undef);
    assert(peg_tip_length!=undef);
    assert(peg_slot_thickness!=undef);
    assert(minimum_base!=undef);
    assert(base_thickness!=undef);
    assert(block_height!=undef);
    assert(counterbore_holder_radius!=undef);
    assert(counterbore_holder_height!=undef);
    assert(bottom_flatness!=undef);
    assert(end_cut_length!=undef);
    assert(skin!=undef);

    length = technic_peg_length(peg_tip_length=peg_tip_length, peg_length=peg_length, counterbore_holder_height=counterbore_holder_height);
    assert(length!=undef);

    difference() {
        intersection() {
            translate([block_width(1/2), block_width(1/2), base_thickness]) {
                difference() {
                    for (i = [0 : array_count-1]) {
                        translate([i*array_spacing, 0, 0]) {
                            if (simplified) {
                                rotate([0, 90, 90]) {
                                    simplified_peg(material=material, large_nozzle=large_nozzle, cut_line=cut_line, axle_radius=axle_radius, peg_center_radius=peg_center_radius, peg_length=peg_length, peg_tip_length=peg_tip_length, peg_slot_thickness=0, bottom_flatness=bottom_flatness, end_cut_length=end_cut_length);
                                }
                            } else {
                                peg(material=material, large_nozzle=large_nozzle, cut_line=cut_line, axle_radius=axle_radius, peg_center_radius=peg_center_radius, peg_length=peg_length, peg_tip_length=peg_tip_length, peg_slot_thickness=peg_slot_thickness);
                            }
                        }
                    }
                    
                    translate([-block_width(), -block_width(), -block_height(1, block_height=block_height)-skin]) {
                        cube([block_width(array_count+1), block_width(2), block_height(1, block_height=block_height)]);
                    }
                }
                
                peg_base(material=material, large_nozzle=large_nozzle, length=length, array_count=array_count, array_spacing=array_spacing, base_thickness=base_thickness, minimum_base=minimum_base, peg_length=peg_length, axle_radius=axle_radius, peg_slot_thickness=peg_slot_thickness, simplified=simplified, bottom_flatness=bottom_flatness, skin=skin);
            }

            if (minimum_base) {
                translate([0, block_width(1/2), 0]) {
                    peg_array_envelope(material=material, large_nozzle=large_nozzle, length=length, array_count=array_count, array_spacing=array_spacing, peg_length=peg_length, peg_tip_length=peg_tip_length, counterbore_holder_radius=counterbore_holder_radius, counterbore_holder_height=counterbore_holder_height);
                }
            } else {
                cube([block_width(array_count), block_width(), length]);
            }
        }

        cut_space(material=material, large_nozzle=large_nozzle, l=4, w=1, cut_line=cut_line, h=2, block_height=block_height, knob_height=_knob_height, skin=skin);
    }
}


// The rounded space which just encloses the peg array but not the rest of the array base
module peg_array_envelope(material, large_nozzle, length, array_count, array_spacing, peg_length, peg_tip_length, counterbore_holder_radius, counterbore_holder_height) {

    assert(material!=undef);
    assert(large_nozzle!=undef);
    assert(length!=undef);
    assert(array_count!=undef);
    assert(array_spacing!=undef);
    assert(peg_length!=undef);
    assert(peg_tip_length!=undef);
    assert(counterbore_holder_radius!=undef);
    assert(counterbore_holder_height!=undef);

    length = technic_peg_length(peg_tip_length=peg_tip_length, peg_length=peg_length, counterbore_holder_height=counterbore_holder_height);

    translate([block_width(0.5), 0, 0]) {
        hull() {
            peg_envelope(material=material, large_nozzle=large_nozzle, length=length, counterbore_holder_radius=counterbore_holder_radius);

            translate([(array_count-1)*array_spacing, 0, 0]) {
                peg_envelope(material=material, large_nozzle=large_nozzle, length=length, counterbore_holder_radius=counterbore_holder_radius);
            }
        }
    }
}


// The connector between pegs in an array
module peg_base(material, large_nozzle, length, array_count, array_spacing, base_thickness, minimum_base, peg_length, axle_radius, peg_slot_thickness, simplified, bottom_flatness, skin) {
    
    assert(material!=undef);
    assert(large_nozzle!=undef);
    assert(length!=undef);
    assert(array_count!=undef);
    assert(array_spacing!=undef);
    assert(base_thickness!=undef);
    assert(minimum_base!=undef);
    assert(peg_length!=undef);
    assert(axle_radius!=undef);
    assert(peg_slot_thickness!=undef);
    assert(simplified!=undef);
    assert(bottom_flatness!=undef);
    assert(skin!=undef);
    
    translate([-block_width(1/2), -block_width(1/2), -base_thickness-skin]) {
        difference() {
            cube([array_count*array_spacing, block_width(1), base_thickness]);
        
            if (simplified) {
                translate([0, block_width(-0.5), 0]) {
                    cube([array_count*array_spacing, block_width() - axle_radius + bottom_flatness, base_thickness+_defeather]);
                }
            } else {
                translate([0, block_width(0,5)- peg_slot_thickness/2, 0]) {
                cube([array_count*array_spacing, peg_slot_thickness, base_thickness]);
                }
            }
        }
    }
}
